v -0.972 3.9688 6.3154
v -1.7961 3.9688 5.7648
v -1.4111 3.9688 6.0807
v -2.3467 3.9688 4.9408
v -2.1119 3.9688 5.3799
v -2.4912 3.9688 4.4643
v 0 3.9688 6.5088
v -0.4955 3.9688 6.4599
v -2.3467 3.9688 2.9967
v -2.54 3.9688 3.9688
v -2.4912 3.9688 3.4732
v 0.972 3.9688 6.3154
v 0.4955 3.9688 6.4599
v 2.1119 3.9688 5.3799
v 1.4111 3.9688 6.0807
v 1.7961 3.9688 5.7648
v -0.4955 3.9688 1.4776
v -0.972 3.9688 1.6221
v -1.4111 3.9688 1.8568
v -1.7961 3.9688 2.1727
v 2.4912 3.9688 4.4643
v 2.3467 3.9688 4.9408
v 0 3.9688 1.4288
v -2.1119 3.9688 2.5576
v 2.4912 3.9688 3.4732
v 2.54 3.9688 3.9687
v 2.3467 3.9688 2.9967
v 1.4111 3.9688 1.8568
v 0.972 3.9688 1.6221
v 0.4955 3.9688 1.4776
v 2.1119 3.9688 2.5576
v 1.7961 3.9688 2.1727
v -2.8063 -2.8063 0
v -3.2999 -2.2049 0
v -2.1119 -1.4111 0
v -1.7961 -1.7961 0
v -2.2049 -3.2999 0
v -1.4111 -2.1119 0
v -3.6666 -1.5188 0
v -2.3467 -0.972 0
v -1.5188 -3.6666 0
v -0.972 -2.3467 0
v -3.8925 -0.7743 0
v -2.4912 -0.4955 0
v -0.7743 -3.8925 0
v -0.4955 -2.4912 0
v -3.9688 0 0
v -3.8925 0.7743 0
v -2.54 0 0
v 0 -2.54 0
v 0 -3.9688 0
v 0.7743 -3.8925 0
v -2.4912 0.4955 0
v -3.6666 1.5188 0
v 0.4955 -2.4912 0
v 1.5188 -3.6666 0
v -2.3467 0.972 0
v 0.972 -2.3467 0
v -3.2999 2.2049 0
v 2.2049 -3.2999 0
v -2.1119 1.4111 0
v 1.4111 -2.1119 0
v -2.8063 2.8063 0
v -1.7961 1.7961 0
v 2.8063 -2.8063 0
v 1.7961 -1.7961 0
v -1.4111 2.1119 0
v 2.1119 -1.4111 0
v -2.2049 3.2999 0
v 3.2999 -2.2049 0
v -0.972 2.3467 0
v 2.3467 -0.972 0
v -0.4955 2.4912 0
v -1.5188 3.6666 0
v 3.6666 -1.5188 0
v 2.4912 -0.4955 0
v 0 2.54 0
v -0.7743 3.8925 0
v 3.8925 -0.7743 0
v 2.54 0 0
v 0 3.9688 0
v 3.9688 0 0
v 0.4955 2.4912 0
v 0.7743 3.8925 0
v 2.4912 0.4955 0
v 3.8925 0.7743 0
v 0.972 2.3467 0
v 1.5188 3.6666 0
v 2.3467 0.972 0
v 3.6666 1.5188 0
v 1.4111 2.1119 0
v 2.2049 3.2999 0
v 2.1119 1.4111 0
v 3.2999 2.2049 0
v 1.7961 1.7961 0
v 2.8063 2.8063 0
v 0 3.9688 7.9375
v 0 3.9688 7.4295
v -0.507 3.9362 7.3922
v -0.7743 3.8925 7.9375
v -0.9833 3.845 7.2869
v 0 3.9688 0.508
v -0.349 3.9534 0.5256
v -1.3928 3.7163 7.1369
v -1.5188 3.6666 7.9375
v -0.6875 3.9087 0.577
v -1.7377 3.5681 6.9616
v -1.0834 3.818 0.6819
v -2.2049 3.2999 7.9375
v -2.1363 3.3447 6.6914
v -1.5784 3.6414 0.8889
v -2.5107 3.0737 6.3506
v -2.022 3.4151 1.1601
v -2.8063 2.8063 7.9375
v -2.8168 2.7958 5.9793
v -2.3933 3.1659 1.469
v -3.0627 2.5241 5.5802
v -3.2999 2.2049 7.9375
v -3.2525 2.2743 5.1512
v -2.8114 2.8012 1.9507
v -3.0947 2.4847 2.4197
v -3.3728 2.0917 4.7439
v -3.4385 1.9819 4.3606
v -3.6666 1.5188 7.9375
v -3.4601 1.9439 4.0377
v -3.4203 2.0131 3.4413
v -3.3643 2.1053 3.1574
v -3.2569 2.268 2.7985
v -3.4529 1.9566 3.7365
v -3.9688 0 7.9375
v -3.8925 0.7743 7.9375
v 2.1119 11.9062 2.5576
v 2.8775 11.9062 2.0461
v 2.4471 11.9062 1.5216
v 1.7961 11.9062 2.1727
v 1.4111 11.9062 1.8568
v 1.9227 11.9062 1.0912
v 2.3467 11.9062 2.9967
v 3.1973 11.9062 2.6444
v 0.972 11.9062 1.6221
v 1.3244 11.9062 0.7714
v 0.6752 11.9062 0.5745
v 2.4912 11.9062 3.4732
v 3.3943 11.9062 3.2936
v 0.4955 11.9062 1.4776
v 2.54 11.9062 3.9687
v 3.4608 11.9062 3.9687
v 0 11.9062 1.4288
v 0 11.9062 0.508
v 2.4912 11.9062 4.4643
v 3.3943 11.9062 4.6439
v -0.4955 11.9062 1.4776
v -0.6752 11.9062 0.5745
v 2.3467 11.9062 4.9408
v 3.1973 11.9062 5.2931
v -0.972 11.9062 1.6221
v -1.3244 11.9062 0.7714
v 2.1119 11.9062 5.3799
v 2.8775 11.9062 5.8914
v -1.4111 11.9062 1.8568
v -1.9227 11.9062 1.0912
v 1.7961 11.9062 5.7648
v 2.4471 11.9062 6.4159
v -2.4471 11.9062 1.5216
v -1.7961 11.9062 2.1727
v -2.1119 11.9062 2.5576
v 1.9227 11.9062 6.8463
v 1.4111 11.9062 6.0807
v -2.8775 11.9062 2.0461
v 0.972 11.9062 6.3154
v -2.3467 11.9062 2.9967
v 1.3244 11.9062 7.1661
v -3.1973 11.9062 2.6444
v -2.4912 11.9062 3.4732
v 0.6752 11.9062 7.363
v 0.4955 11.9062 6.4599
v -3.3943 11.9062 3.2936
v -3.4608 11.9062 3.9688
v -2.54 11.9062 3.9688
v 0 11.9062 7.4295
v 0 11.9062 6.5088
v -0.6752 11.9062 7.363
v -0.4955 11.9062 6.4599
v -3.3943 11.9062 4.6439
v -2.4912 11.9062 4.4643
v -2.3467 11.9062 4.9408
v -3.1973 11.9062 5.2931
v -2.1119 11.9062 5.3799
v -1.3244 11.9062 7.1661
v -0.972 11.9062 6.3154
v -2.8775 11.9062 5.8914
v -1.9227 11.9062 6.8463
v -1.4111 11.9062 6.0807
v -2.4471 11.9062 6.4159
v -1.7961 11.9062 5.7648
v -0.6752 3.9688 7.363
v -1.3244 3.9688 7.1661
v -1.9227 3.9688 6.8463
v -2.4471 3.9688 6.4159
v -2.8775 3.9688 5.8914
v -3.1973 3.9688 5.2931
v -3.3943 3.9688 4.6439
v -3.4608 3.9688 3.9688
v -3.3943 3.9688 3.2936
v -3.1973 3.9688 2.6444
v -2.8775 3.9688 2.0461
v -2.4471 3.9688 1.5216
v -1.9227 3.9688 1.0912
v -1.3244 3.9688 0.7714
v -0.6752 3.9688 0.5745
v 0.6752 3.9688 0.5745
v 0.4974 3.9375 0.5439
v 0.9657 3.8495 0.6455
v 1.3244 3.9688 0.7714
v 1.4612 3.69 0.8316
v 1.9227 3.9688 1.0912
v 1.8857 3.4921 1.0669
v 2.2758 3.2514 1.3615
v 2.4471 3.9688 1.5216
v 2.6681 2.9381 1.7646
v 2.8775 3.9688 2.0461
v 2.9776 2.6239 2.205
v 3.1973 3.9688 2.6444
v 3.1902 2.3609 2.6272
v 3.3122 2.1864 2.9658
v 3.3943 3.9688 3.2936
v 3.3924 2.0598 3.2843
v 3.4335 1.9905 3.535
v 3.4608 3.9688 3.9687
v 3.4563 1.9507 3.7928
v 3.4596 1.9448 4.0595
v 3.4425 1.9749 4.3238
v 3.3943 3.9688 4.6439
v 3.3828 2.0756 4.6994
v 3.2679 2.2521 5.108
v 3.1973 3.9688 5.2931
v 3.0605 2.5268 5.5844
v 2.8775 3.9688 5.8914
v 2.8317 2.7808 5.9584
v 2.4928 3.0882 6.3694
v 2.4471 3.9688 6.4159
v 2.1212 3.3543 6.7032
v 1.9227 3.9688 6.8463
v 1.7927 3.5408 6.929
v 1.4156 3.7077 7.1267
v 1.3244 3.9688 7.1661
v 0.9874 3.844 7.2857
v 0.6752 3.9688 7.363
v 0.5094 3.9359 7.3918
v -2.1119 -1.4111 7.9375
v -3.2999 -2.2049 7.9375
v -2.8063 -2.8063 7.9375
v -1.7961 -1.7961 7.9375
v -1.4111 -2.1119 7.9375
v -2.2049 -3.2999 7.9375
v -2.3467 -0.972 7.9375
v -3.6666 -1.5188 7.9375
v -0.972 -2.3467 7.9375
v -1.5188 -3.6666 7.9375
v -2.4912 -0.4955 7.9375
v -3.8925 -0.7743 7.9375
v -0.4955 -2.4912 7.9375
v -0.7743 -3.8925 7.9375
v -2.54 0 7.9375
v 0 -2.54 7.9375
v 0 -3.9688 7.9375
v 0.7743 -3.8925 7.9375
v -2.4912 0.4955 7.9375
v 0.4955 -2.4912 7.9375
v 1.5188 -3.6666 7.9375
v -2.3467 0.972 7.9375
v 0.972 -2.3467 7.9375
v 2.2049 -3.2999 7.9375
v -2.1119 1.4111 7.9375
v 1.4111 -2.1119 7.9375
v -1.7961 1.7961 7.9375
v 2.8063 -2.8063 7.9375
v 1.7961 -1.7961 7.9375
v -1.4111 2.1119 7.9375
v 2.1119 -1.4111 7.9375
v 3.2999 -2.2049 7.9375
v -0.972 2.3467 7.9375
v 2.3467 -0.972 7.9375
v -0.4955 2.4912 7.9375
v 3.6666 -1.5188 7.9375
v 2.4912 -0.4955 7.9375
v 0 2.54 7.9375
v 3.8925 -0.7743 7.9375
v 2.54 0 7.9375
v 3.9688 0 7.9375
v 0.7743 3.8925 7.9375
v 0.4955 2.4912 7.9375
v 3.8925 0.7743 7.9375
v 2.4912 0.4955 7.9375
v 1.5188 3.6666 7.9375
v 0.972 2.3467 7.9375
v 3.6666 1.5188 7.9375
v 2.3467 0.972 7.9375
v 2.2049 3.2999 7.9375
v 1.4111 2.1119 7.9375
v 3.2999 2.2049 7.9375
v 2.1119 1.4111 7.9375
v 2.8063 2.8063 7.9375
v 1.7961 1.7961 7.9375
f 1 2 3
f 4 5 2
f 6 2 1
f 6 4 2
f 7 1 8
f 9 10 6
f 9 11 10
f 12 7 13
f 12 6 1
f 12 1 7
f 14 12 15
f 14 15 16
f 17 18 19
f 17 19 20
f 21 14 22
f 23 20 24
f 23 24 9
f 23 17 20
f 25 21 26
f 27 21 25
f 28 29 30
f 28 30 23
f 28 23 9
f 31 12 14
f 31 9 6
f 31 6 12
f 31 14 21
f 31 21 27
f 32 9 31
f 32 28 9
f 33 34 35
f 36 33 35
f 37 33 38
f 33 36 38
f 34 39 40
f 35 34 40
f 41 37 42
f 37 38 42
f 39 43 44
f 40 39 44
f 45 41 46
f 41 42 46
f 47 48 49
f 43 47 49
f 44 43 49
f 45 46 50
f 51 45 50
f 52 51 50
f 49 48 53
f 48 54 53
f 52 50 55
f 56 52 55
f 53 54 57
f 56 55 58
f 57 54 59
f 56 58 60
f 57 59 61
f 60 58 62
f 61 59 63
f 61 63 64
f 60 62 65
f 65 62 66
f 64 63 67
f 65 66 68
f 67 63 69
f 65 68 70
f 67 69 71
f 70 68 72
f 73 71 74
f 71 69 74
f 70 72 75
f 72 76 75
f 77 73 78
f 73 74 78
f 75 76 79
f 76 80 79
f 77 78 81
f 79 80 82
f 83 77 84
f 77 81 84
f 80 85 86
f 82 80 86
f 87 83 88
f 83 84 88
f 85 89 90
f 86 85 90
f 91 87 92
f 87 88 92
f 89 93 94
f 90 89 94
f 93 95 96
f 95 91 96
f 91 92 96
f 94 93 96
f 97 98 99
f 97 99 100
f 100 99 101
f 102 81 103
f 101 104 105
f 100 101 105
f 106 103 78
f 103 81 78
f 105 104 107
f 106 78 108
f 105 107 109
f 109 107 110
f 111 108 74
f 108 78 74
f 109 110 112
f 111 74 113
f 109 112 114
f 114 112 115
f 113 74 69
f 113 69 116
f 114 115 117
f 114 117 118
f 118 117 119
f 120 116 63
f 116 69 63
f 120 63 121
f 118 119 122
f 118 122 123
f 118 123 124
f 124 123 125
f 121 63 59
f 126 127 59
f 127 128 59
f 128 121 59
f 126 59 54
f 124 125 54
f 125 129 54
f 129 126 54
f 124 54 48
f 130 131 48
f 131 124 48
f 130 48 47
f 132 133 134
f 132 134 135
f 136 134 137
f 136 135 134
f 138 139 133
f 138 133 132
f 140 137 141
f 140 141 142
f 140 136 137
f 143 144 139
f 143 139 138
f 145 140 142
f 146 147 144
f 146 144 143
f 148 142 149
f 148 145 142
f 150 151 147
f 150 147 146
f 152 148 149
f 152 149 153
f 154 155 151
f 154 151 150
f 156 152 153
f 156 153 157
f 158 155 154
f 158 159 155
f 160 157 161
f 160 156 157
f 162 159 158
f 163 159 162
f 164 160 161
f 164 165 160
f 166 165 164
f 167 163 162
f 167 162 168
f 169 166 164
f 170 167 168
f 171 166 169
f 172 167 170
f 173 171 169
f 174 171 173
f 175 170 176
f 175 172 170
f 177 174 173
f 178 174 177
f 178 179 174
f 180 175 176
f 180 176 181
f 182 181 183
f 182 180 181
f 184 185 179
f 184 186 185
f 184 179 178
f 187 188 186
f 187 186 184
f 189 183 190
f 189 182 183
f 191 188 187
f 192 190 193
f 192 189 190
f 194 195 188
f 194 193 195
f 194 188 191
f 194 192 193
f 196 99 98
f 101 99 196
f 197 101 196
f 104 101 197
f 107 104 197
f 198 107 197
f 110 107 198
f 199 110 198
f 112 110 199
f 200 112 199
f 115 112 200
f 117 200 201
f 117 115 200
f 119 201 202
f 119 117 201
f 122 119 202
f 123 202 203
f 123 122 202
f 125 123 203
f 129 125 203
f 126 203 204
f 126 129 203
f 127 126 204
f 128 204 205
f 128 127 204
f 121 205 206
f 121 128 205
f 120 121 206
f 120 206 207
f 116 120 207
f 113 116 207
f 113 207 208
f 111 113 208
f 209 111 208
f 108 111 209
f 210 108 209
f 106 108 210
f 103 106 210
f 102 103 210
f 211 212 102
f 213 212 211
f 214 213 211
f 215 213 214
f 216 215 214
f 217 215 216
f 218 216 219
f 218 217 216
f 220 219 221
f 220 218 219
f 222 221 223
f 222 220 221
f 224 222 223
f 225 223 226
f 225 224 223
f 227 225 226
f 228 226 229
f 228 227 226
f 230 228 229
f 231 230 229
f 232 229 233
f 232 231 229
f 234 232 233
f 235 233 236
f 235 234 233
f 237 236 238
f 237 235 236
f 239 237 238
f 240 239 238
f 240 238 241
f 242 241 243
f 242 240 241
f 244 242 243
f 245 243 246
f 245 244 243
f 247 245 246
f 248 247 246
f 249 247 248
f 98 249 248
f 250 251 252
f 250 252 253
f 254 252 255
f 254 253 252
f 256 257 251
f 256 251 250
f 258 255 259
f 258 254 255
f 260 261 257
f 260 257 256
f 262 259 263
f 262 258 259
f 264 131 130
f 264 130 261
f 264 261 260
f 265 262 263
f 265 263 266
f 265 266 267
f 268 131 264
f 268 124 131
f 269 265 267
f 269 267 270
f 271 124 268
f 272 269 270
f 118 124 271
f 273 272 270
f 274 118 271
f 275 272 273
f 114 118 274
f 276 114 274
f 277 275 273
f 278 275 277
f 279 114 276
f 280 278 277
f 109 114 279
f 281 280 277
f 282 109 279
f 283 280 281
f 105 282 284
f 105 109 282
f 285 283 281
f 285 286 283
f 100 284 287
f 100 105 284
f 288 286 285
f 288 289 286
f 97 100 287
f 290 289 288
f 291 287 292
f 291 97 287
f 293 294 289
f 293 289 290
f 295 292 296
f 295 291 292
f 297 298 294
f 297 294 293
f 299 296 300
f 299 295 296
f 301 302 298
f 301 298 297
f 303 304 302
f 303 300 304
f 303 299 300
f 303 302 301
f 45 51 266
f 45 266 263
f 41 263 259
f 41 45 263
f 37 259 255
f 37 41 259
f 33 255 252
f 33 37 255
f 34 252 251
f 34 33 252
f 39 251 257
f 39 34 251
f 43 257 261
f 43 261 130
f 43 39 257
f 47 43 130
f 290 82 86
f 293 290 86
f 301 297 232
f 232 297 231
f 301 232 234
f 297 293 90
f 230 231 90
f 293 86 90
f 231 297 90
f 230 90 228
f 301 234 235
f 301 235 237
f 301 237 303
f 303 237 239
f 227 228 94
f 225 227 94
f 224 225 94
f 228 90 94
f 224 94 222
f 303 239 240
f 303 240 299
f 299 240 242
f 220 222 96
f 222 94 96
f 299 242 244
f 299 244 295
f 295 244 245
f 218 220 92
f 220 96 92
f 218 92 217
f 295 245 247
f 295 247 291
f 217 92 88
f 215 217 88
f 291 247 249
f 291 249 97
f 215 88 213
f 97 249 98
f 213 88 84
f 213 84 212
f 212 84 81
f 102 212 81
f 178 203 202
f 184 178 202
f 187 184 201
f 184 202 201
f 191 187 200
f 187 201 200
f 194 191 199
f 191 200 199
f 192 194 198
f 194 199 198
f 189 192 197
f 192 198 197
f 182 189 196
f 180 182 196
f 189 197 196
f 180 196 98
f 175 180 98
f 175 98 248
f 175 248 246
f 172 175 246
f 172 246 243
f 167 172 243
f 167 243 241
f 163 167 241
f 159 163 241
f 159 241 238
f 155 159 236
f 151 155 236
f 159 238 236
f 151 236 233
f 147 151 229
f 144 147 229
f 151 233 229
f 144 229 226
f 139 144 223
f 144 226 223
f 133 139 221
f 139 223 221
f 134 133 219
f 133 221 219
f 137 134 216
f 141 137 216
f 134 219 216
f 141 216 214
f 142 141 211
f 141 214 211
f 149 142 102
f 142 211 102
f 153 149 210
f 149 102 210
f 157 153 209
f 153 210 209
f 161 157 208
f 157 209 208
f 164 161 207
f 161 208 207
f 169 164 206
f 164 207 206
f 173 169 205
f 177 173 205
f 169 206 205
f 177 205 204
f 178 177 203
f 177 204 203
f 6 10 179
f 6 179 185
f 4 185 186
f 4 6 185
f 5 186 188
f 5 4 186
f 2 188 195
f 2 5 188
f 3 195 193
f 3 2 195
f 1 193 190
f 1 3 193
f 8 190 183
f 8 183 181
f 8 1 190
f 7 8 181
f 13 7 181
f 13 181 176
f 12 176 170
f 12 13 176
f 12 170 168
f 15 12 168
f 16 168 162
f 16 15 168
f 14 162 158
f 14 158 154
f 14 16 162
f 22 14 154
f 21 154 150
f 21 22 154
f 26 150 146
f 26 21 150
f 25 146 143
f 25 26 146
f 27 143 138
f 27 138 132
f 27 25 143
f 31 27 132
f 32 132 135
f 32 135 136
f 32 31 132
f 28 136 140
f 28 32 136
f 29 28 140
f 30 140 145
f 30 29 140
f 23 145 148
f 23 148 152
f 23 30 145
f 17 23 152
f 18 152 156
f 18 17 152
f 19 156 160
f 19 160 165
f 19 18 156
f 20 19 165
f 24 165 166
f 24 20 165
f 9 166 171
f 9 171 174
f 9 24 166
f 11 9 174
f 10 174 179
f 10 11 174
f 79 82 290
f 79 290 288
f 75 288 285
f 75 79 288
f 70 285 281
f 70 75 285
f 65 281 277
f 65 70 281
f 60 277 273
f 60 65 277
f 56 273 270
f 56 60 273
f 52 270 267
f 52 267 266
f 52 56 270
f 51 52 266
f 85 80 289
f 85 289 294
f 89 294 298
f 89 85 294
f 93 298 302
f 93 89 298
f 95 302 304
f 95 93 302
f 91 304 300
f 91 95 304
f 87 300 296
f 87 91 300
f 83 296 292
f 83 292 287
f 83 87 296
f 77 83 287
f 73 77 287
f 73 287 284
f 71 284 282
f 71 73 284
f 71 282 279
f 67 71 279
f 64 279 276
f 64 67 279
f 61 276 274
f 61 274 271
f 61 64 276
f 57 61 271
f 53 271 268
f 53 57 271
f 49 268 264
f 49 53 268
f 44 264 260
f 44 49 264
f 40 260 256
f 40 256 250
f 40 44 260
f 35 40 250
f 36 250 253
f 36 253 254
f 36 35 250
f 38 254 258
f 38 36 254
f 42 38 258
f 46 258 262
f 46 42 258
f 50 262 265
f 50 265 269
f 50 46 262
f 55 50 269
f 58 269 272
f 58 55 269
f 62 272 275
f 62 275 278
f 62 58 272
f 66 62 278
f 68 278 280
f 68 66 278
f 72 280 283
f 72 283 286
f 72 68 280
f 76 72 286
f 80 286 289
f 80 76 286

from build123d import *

# Parameters (mm, degrees)
F0_W         = 7.9375
F0_H         = 7.9375
F0_R         = 2.54
F1_DEPTH     = 7.9375
F2_R         = 3.46075
F2_R_2       = 2.54
F3_DEPTH     = 7.9375
F4_T3_DEPTH  = 27.78125
F4_S4_R      = 3.46075
F4_T5_DEPTH  = 16
F4_T8_DEPTH  = 27.78125
F4_S9_R      = 3.46075
F4_T10_DEPTH = 16
F4_T13_DEPTH = 27.78125
F4_T16_DEPTH = 27.78125


# Not quite as in the source:
# - a fillet or chamfer that OpenCascade refuses, or shapes differently, is made with other operations: its cross-section is extruded or revolved along the edge and cut away or added


with BuildPart() as f1:
    # F0 (on Top) → F1 (new body)
    with BuildSketch(Plane.XY):
        Rectangle(F0_W, F0_H)
        Circle(F0_R, mode=Mode.SUBTRACT)
    extrude(amount=F1_DEPTH)

    # F2 (on face) → F3 (join)
    with BuildSketch(Plane(origin=(0, 3.96875, 0), x_dir=(-1, 0, 0), z_dir=(0, 1, 0))):
        with Locations((0, 3.96875)):
            Circle(F2_R)
        with Locations((0, 3.96875)):
            Circle(F2_R_2, mode=Mode.SUBTRACT)
    extrude(amount=F3_DEPTH)

    # F4: fillet of radius 3.96875 on 4 edges, made by hand


with BuildPart() as f4_tool1:
    # F4_s2 → F4_t3 (new body)
    with BuildSketch(Plane.XY.offset(-9.921875)):
        with BuildLine():
            ThreePointArc((0, 3.96875), (-2.8063300378, 2.8063300378), (-3.96875, 0))
            Line((-3.96875, 0), (-3.96875, 3.96875))
            Line((-3.96875, 3.96875), (0, 3.96875))
        make_face()
    extrude(amount=F4_T3_DEPTH)

    # F4_s4 → F4_t5 (cut, symmetric)
    with BuildSketch(Plane.XZ.offset(-2)):
        with Locations((0, 3.96875)):
            Circle(F4_S4_R)
    extrude(amount=F4_T5_DEPTH, both=True, mode=Mode.SUBTRACT)


with BuildPart() as f4_tool6:
    # F4_s7 → F4_t8 (new body)
    with BuildSketch(Plane.XY.offset(-9.921875)):
        with BuildLine():
            ThreePointArc((3.96875, 0), (2.8063300378, 2.8063300378), (0, 3.96875))
            Line((0, 3.96875), (3.96875, 3.96875))
            Line((3.96875, 3.96875), (3.96875, 0))
        make_face()
    extrude(amount=F4_T8_DEPTH)

    # F4_s9 → F4_t10 (cut, symmetric)
    with BuildSketch(Plane.XZ.offset(-2)):
        with Locations((0, 3.96875)):
            Circle(F4_S9_R)
    extrude(amount=F4_T10_DEPTH, both=True, mode=Mode.SUBTRACT)


with BuildPart() as f4_tool11:
    # F4_s12 → F4_t13 (new body)
    with BuildSketch(Plane.XY.offset(-9.921875)):
        with BuildLine():
            ThreePointArc((3.96875, 0), (2.8063300378, -2.8063300378), (0, -3.96875))
            Line((0, -3.96875), (3.96875, -3.96875))
            Line((3.96875, -3.96875), (3.96875, 0))
        make_face()
    extrude(amount=F4_T13_DEPTH)


with BuildPart() as f4_tool14:
    # F4_s15 → F4_t16 (new body)
    with BuildSketch(Plane.XY.offset(-9.921875)):
        with BuildLine():
            ThreePointArc((0, -3.96875), (-2.8063300378, -2.8063300378), (-3.96875, 0))
            Line((-3.96875, 0), (-3.96875, -3.96875))
            Line((-3.96875, -3.96875), (0, -3.96875))
        make_face()
    extrude(amount=F4_T16_DEPTH)


with BuildPart() as f1_1:
    add(f1.part)

    # F4_t17: cut F4_tool1, F4_tool6, F4_tool11, F4_tool14
    add([f4_tool1.part, f4_tool6.part, f4_tool11.part, f4_tool14.part], mode=Mode.SUBTRACT)


solid = f1_1.part
